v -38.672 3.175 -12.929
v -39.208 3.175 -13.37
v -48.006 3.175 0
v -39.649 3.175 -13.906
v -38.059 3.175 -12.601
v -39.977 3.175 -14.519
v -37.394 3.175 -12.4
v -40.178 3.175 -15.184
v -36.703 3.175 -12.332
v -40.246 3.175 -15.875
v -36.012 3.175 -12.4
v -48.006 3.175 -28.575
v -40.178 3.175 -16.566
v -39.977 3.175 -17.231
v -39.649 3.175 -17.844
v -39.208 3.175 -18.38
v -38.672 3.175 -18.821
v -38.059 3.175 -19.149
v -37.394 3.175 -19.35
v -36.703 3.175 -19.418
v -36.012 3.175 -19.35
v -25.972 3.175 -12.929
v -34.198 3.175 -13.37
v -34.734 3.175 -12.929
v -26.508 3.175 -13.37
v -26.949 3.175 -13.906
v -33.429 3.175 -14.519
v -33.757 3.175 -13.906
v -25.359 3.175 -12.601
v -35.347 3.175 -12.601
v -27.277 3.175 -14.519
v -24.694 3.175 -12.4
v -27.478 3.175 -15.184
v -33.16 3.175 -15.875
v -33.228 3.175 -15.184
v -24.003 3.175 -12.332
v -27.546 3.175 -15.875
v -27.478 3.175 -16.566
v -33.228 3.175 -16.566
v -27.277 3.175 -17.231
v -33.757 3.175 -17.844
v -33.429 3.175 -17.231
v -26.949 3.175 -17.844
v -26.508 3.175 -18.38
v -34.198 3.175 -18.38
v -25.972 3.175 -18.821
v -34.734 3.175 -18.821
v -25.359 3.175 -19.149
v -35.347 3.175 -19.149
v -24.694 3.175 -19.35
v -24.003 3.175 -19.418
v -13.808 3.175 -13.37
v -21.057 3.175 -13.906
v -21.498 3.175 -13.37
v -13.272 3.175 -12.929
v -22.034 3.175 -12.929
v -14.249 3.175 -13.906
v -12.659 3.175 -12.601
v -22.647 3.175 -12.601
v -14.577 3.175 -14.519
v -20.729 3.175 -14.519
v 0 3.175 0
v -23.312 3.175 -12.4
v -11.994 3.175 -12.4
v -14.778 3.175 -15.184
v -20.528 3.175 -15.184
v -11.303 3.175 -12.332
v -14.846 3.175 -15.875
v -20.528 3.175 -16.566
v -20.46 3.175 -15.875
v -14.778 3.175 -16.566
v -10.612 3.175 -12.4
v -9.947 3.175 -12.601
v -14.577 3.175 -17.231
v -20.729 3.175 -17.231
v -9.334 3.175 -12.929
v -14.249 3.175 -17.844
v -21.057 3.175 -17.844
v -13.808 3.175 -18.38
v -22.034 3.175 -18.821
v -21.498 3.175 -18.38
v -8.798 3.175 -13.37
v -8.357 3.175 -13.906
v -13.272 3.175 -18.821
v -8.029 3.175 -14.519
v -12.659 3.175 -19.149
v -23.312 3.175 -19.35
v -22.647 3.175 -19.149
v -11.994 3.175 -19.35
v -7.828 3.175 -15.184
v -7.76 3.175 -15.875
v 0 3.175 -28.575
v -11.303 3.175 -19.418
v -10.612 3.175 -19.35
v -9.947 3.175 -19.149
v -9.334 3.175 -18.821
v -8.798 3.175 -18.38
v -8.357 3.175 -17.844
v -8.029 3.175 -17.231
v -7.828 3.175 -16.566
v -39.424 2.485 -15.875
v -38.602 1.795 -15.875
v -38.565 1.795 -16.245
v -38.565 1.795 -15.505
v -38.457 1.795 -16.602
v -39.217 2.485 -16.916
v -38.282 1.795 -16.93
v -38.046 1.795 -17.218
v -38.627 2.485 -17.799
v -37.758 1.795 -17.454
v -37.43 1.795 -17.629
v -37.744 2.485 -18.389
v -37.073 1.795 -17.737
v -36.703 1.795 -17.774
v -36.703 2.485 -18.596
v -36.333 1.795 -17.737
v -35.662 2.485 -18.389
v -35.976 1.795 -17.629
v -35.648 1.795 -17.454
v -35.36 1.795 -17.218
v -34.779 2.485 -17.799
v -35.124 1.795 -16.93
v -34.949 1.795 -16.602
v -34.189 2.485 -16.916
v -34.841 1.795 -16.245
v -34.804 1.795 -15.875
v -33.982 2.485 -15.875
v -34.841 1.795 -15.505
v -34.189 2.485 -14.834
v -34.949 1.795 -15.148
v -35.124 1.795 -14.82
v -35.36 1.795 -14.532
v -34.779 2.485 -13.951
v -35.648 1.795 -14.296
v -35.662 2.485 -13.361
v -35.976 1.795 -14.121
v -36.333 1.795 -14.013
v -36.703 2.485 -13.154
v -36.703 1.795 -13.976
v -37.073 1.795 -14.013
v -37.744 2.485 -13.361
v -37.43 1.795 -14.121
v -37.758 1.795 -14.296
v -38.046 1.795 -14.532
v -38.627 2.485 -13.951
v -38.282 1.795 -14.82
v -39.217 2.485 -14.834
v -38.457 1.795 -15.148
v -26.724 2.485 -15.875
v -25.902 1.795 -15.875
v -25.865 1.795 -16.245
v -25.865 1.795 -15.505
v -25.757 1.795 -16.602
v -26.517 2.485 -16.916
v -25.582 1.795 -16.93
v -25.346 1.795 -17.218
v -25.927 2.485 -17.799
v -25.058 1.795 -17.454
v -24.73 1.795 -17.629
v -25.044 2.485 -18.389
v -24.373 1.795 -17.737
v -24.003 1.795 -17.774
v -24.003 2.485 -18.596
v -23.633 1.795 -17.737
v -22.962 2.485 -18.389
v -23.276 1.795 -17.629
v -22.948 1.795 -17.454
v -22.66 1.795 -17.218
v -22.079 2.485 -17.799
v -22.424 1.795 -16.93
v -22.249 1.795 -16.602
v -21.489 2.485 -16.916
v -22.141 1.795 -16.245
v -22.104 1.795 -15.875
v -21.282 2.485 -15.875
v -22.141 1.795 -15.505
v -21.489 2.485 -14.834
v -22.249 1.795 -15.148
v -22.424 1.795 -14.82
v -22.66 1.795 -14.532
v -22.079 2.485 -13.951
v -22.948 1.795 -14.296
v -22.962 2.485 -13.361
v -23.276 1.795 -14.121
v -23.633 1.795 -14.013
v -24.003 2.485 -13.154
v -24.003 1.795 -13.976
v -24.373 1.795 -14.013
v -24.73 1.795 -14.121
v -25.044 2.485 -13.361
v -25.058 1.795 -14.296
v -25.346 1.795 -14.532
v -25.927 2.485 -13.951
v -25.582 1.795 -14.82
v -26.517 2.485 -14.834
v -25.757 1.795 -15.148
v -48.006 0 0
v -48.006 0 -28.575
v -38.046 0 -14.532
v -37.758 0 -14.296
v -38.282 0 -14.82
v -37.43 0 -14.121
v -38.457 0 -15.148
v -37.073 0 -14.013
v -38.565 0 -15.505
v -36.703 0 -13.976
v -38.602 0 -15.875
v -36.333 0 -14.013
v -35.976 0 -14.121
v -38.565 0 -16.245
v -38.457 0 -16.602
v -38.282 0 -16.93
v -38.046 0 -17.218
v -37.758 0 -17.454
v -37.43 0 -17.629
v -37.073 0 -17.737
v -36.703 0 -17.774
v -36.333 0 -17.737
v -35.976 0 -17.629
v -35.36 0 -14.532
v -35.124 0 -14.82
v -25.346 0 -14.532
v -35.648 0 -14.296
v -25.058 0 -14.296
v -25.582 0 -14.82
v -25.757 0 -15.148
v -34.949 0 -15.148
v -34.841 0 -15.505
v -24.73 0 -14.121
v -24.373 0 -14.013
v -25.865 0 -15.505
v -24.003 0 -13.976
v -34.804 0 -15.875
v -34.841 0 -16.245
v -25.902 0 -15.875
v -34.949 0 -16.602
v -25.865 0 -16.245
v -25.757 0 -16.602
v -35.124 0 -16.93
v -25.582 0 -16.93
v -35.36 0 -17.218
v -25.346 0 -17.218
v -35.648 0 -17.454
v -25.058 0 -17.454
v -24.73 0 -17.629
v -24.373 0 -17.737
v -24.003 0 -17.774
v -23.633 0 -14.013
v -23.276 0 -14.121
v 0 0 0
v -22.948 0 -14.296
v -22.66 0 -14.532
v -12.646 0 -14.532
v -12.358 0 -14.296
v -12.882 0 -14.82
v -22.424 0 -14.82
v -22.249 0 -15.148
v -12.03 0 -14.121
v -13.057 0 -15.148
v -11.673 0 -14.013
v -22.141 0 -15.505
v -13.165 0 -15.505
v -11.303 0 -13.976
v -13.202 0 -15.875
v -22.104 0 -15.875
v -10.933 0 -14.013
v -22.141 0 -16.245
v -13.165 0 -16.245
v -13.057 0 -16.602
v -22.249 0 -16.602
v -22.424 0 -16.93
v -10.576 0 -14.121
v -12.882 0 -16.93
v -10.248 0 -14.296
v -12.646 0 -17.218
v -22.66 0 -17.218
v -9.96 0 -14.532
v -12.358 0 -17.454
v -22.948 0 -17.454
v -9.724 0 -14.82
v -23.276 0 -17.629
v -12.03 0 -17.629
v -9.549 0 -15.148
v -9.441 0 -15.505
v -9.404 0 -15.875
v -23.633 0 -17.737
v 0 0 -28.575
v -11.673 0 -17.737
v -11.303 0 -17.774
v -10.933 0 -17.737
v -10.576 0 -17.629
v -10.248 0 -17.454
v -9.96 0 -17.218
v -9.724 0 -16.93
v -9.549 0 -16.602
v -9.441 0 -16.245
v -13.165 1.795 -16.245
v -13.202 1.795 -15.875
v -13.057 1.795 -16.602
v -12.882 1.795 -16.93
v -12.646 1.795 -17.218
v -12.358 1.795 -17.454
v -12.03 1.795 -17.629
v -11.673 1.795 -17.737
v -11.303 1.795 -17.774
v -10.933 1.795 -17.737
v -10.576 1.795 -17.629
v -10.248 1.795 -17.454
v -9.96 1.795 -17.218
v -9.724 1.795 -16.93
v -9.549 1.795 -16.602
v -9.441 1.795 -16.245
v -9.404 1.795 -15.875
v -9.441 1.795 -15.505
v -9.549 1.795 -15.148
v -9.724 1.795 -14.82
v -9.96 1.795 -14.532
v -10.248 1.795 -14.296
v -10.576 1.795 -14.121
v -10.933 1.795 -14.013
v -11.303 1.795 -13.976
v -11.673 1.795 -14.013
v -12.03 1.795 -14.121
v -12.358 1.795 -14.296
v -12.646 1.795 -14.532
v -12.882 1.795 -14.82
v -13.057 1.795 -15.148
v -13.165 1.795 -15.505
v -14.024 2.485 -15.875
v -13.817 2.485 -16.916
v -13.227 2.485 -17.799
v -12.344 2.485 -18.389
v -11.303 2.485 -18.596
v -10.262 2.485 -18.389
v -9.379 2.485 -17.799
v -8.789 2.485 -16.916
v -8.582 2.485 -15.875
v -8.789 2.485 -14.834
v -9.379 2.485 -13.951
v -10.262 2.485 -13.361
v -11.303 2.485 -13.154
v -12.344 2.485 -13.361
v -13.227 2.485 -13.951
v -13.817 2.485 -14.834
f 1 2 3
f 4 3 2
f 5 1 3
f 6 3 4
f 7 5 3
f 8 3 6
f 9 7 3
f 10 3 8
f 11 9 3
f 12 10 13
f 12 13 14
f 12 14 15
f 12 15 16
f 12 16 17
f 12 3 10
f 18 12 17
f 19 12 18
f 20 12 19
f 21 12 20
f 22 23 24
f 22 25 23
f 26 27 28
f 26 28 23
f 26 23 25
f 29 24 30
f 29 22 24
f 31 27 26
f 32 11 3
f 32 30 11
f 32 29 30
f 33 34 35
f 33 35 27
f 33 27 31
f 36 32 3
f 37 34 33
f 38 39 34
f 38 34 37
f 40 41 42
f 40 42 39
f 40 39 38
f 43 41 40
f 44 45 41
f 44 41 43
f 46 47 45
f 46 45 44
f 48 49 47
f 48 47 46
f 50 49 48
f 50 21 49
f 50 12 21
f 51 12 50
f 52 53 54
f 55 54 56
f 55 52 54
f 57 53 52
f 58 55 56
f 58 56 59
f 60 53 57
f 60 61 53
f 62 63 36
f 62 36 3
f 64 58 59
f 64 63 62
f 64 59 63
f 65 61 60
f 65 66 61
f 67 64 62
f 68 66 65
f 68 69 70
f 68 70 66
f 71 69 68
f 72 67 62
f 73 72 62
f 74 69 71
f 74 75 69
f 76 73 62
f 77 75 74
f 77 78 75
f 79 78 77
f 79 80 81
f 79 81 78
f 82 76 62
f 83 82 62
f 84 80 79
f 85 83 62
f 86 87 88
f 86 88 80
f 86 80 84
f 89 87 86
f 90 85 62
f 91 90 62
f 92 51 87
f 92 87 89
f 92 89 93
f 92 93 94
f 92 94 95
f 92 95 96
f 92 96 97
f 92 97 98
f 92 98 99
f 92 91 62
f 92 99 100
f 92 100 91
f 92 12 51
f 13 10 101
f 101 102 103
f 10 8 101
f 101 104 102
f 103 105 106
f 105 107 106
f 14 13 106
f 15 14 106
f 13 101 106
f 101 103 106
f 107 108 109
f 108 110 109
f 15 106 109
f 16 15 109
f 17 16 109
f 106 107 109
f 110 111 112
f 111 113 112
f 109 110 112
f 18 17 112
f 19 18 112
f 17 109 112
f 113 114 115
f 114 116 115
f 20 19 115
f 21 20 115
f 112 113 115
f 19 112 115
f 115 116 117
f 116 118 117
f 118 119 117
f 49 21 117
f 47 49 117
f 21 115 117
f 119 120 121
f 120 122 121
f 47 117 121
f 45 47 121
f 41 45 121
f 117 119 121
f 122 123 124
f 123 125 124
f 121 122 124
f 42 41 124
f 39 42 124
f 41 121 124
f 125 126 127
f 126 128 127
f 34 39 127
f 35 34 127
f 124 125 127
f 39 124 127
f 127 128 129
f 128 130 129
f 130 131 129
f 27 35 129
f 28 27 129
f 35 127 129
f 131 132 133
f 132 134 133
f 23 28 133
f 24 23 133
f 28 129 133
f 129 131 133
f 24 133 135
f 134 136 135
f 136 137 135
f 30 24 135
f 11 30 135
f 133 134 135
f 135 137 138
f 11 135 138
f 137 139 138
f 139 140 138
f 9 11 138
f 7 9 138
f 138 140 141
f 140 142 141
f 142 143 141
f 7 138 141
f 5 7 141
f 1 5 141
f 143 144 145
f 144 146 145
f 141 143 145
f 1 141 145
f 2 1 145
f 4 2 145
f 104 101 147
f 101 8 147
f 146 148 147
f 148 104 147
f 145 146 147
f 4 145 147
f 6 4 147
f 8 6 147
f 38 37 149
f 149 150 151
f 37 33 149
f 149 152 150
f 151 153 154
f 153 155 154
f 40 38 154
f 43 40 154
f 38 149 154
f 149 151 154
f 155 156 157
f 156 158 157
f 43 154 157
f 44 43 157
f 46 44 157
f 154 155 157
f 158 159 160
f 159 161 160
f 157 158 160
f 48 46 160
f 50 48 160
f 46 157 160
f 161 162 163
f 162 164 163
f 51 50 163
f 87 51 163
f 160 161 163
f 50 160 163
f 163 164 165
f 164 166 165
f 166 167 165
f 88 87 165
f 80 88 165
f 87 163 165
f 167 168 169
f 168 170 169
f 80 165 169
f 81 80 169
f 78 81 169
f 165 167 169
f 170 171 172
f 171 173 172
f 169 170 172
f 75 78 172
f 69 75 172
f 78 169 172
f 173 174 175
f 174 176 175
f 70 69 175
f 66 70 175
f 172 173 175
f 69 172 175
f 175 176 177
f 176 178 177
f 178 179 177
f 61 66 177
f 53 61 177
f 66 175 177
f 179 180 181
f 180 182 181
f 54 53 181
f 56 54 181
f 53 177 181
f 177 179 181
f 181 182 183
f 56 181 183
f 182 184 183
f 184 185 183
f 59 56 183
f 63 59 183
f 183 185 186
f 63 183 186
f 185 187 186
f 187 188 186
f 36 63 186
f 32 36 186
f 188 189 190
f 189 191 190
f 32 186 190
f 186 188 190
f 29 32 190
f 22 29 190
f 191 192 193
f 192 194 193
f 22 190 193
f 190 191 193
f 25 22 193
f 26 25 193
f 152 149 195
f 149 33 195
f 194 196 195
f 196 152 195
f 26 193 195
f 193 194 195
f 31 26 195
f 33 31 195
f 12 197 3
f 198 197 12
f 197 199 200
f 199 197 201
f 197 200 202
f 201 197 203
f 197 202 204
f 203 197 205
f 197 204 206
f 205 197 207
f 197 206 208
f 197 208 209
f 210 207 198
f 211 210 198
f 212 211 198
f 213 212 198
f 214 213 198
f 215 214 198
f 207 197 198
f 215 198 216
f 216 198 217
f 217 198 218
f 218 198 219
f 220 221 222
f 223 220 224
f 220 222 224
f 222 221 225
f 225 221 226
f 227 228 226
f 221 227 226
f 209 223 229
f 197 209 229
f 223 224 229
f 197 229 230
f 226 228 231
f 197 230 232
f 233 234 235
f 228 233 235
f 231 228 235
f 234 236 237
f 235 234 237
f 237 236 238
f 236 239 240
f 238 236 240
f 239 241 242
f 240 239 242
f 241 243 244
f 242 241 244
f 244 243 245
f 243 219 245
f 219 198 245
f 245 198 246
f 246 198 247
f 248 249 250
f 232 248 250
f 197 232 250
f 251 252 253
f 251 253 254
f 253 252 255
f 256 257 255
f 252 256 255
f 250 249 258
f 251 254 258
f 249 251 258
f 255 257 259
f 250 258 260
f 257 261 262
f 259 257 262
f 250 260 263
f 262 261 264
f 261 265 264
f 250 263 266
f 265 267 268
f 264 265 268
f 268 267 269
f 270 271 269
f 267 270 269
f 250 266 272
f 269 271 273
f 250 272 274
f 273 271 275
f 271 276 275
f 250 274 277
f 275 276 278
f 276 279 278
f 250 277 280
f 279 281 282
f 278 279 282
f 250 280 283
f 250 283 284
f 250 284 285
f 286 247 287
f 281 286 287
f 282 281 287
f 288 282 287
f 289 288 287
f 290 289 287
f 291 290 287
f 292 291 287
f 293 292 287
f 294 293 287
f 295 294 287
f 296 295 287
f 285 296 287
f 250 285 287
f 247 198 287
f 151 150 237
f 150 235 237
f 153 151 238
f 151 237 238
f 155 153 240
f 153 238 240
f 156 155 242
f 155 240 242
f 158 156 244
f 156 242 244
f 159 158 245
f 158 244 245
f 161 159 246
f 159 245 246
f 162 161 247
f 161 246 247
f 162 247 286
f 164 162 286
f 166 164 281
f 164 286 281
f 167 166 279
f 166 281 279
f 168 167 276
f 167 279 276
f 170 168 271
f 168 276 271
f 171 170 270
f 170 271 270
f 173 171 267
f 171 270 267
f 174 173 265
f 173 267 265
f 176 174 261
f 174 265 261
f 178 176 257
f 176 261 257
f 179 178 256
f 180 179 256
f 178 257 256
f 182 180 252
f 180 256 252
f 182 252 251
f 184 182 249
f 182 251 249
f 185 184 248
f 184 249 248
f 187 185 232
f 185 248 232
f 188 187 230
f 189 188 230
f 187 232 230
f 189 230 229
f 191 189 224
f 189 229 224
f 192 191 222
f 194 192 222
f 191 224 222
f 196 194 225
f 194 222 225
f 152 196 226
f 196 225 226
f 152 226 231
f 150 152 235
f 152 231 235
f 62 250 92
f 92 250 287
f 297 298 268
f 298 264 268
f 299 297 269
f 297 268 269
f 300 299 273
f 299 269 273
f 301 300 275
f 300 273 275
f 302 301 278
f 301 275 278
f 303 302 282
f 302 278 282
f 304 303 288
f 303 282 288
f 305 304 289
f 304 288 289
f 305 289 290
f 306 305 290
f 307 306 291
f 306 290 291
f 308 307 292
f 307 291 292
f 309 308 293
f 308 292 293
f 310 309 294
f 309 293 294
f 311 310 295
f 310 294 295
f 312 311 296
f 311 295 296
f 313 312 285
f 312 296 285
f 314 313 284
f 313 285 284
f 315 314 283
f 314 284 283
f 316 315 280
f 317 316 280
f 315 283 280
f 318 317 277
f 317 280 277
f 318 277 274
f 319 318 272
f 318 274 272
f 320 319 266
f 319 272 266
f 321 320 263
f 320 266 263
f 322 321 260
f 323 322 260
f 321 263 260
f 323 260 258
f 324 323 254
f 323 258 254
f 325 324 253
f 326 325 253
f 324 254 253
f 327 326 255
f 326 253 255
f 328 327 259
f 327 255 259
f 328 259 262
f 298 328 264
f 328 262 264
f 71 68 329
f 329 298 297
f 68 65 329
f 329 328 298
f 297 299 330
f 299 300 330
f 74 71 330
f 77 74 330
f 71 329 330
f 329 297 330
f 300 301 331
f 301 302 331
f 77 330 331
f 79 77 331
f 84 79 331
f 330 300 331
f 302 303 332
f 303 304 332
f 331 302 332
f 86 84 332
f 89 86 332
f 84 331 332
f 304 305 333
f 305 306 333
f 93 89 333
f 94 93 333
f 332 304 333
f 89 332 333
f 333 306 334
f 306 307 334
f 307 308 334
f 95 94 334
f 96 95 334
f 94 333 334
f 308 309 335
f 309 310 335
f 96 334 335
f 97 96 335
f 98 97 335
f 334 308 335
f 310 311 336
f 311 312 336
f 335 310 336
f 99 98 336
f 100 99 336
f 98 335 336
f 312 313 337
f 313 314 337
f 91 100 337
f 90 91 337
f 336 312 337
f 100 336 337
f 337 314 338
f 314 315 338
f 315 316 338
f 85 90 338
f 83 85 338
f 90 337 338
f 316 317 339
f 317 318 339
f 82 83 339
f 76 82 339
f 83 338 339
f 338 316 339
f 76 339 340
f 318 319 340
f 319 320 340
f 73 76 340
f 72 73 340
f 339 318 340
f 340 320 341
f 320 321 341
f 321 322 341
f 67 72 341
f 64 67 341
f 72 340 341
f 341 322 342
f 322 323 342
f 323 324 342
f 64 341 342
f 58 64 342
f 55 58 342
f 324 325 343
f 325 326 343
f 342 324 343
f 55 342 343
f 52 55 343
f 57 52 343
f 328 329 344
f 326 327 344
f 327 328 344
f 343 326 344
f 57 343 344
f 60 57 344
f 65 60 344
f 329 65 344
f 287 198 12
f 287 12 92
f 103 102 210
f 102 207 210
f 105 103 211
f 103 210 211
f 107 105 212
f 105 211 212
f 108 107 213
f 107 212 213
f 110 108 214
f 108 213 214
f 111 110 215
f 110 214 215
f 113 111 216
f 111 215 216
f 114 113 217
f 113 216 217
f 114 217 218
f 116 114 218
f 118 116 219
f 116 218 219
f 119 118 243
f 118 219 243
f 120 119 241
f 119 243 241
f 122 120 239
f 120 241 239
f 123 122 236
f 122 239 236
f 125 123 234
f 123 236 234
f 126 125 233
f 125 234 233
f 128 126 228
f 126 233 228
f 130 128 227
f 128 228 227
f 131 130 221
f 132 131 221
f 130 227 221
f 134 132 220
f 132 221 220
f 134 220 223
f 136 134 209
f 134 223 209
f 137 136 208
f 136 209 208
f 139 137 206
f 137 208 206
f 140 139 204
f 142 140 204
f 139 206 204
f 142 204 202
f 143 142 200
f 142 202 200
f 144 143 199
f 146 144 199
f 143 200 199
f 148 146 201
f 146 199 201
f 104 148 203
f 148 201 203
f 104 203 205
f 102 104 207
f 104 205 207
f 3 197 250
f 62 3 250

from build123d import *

# Parameters (mm, degrees)
SKETCH1_W                                         = 48.006
SKETCH1_H                                         = 28.575
BOSS_EXTRUDE1_DEPTH                               = 3.175
CSK_FOR_6_FLAT_HEAD_MACHINE_SCREW_100_D           = 3.7973
CSK_FOR_6_FLAT_HEAD_MACHINE_SCREW_100_CSINK_D     = 7.0866
CSK_FOR_6_FLAT_HEAD_MACHINE_SCREW_100_CSINK_ANGLE = 100
LPATTERN1_COUNT                                   = 2
LPATTERN1_PITCH                                   = 12.7
LPATTERN1_COL_COUNT                               = 2
LPATTERN1_COL_PITCH                               = 12.7


with BuildPart() as part:
    # Sketch1 → Boss-Extrude1 (new body)
    with BuildSketch(Plane(origin=(0, 0, 0), x_dir=(1, 0, 0), z_dir=(0, 1, 0))):
        with Locations((-24.003, 14.2875)):
            Rectangle(SKETCH1_W, SKETCH1_H)
    extrude(amount=BOSS_EXTRUDE1_DEPTH)

    # CSK for #6 Flat Head Machine Screw (100)1 (through all)
    with Locations(Plane(origin=(0, 3.175, 0), x_dir=(1, 0, 0), z_dir=(0, 1, 0))):
        with Locations((-24.003, 15.875)):
            csk_for_6_flat_head_machine_screw_100 = CounterSinkHole(CSK_FOR_6_FLAT_HEAD_MACHINE_SCREW_100_D / 2, CSK_FOR_6_FLAT_HEAD_MACHINE_SCREW_100_CSINK_D / 2, counter_sink_angle=CSK_FOR_6_FLAT_HEAD_MACHINE_SCREW_100_CSINK_ANGLE)

    # LPattern1: CSK for #6 Flat Head Machine Screw (100)1 ×2
    with Locations(*[(i * LPATTERN1_PITCH, 0, 0) for i in range(1, LPATTERN1_COUNT)]):
        add(csk_for_6_flat_head_machine_screw_100, mode=Mode.SUBTRACT)

    # LPattern1 col: CSK for #6 Flat Head Machine Screw (100)1 ×2
    with Locations(*[(-i * LPATTERN1_COL_PITCH, 0, 0) for i in range(1, LPATTERN1_COL_COUNT)]):
        add(csk_for_6_flat_head_machine_screw_100, mode=Mode.SUBTRACT)


solid = part.part
